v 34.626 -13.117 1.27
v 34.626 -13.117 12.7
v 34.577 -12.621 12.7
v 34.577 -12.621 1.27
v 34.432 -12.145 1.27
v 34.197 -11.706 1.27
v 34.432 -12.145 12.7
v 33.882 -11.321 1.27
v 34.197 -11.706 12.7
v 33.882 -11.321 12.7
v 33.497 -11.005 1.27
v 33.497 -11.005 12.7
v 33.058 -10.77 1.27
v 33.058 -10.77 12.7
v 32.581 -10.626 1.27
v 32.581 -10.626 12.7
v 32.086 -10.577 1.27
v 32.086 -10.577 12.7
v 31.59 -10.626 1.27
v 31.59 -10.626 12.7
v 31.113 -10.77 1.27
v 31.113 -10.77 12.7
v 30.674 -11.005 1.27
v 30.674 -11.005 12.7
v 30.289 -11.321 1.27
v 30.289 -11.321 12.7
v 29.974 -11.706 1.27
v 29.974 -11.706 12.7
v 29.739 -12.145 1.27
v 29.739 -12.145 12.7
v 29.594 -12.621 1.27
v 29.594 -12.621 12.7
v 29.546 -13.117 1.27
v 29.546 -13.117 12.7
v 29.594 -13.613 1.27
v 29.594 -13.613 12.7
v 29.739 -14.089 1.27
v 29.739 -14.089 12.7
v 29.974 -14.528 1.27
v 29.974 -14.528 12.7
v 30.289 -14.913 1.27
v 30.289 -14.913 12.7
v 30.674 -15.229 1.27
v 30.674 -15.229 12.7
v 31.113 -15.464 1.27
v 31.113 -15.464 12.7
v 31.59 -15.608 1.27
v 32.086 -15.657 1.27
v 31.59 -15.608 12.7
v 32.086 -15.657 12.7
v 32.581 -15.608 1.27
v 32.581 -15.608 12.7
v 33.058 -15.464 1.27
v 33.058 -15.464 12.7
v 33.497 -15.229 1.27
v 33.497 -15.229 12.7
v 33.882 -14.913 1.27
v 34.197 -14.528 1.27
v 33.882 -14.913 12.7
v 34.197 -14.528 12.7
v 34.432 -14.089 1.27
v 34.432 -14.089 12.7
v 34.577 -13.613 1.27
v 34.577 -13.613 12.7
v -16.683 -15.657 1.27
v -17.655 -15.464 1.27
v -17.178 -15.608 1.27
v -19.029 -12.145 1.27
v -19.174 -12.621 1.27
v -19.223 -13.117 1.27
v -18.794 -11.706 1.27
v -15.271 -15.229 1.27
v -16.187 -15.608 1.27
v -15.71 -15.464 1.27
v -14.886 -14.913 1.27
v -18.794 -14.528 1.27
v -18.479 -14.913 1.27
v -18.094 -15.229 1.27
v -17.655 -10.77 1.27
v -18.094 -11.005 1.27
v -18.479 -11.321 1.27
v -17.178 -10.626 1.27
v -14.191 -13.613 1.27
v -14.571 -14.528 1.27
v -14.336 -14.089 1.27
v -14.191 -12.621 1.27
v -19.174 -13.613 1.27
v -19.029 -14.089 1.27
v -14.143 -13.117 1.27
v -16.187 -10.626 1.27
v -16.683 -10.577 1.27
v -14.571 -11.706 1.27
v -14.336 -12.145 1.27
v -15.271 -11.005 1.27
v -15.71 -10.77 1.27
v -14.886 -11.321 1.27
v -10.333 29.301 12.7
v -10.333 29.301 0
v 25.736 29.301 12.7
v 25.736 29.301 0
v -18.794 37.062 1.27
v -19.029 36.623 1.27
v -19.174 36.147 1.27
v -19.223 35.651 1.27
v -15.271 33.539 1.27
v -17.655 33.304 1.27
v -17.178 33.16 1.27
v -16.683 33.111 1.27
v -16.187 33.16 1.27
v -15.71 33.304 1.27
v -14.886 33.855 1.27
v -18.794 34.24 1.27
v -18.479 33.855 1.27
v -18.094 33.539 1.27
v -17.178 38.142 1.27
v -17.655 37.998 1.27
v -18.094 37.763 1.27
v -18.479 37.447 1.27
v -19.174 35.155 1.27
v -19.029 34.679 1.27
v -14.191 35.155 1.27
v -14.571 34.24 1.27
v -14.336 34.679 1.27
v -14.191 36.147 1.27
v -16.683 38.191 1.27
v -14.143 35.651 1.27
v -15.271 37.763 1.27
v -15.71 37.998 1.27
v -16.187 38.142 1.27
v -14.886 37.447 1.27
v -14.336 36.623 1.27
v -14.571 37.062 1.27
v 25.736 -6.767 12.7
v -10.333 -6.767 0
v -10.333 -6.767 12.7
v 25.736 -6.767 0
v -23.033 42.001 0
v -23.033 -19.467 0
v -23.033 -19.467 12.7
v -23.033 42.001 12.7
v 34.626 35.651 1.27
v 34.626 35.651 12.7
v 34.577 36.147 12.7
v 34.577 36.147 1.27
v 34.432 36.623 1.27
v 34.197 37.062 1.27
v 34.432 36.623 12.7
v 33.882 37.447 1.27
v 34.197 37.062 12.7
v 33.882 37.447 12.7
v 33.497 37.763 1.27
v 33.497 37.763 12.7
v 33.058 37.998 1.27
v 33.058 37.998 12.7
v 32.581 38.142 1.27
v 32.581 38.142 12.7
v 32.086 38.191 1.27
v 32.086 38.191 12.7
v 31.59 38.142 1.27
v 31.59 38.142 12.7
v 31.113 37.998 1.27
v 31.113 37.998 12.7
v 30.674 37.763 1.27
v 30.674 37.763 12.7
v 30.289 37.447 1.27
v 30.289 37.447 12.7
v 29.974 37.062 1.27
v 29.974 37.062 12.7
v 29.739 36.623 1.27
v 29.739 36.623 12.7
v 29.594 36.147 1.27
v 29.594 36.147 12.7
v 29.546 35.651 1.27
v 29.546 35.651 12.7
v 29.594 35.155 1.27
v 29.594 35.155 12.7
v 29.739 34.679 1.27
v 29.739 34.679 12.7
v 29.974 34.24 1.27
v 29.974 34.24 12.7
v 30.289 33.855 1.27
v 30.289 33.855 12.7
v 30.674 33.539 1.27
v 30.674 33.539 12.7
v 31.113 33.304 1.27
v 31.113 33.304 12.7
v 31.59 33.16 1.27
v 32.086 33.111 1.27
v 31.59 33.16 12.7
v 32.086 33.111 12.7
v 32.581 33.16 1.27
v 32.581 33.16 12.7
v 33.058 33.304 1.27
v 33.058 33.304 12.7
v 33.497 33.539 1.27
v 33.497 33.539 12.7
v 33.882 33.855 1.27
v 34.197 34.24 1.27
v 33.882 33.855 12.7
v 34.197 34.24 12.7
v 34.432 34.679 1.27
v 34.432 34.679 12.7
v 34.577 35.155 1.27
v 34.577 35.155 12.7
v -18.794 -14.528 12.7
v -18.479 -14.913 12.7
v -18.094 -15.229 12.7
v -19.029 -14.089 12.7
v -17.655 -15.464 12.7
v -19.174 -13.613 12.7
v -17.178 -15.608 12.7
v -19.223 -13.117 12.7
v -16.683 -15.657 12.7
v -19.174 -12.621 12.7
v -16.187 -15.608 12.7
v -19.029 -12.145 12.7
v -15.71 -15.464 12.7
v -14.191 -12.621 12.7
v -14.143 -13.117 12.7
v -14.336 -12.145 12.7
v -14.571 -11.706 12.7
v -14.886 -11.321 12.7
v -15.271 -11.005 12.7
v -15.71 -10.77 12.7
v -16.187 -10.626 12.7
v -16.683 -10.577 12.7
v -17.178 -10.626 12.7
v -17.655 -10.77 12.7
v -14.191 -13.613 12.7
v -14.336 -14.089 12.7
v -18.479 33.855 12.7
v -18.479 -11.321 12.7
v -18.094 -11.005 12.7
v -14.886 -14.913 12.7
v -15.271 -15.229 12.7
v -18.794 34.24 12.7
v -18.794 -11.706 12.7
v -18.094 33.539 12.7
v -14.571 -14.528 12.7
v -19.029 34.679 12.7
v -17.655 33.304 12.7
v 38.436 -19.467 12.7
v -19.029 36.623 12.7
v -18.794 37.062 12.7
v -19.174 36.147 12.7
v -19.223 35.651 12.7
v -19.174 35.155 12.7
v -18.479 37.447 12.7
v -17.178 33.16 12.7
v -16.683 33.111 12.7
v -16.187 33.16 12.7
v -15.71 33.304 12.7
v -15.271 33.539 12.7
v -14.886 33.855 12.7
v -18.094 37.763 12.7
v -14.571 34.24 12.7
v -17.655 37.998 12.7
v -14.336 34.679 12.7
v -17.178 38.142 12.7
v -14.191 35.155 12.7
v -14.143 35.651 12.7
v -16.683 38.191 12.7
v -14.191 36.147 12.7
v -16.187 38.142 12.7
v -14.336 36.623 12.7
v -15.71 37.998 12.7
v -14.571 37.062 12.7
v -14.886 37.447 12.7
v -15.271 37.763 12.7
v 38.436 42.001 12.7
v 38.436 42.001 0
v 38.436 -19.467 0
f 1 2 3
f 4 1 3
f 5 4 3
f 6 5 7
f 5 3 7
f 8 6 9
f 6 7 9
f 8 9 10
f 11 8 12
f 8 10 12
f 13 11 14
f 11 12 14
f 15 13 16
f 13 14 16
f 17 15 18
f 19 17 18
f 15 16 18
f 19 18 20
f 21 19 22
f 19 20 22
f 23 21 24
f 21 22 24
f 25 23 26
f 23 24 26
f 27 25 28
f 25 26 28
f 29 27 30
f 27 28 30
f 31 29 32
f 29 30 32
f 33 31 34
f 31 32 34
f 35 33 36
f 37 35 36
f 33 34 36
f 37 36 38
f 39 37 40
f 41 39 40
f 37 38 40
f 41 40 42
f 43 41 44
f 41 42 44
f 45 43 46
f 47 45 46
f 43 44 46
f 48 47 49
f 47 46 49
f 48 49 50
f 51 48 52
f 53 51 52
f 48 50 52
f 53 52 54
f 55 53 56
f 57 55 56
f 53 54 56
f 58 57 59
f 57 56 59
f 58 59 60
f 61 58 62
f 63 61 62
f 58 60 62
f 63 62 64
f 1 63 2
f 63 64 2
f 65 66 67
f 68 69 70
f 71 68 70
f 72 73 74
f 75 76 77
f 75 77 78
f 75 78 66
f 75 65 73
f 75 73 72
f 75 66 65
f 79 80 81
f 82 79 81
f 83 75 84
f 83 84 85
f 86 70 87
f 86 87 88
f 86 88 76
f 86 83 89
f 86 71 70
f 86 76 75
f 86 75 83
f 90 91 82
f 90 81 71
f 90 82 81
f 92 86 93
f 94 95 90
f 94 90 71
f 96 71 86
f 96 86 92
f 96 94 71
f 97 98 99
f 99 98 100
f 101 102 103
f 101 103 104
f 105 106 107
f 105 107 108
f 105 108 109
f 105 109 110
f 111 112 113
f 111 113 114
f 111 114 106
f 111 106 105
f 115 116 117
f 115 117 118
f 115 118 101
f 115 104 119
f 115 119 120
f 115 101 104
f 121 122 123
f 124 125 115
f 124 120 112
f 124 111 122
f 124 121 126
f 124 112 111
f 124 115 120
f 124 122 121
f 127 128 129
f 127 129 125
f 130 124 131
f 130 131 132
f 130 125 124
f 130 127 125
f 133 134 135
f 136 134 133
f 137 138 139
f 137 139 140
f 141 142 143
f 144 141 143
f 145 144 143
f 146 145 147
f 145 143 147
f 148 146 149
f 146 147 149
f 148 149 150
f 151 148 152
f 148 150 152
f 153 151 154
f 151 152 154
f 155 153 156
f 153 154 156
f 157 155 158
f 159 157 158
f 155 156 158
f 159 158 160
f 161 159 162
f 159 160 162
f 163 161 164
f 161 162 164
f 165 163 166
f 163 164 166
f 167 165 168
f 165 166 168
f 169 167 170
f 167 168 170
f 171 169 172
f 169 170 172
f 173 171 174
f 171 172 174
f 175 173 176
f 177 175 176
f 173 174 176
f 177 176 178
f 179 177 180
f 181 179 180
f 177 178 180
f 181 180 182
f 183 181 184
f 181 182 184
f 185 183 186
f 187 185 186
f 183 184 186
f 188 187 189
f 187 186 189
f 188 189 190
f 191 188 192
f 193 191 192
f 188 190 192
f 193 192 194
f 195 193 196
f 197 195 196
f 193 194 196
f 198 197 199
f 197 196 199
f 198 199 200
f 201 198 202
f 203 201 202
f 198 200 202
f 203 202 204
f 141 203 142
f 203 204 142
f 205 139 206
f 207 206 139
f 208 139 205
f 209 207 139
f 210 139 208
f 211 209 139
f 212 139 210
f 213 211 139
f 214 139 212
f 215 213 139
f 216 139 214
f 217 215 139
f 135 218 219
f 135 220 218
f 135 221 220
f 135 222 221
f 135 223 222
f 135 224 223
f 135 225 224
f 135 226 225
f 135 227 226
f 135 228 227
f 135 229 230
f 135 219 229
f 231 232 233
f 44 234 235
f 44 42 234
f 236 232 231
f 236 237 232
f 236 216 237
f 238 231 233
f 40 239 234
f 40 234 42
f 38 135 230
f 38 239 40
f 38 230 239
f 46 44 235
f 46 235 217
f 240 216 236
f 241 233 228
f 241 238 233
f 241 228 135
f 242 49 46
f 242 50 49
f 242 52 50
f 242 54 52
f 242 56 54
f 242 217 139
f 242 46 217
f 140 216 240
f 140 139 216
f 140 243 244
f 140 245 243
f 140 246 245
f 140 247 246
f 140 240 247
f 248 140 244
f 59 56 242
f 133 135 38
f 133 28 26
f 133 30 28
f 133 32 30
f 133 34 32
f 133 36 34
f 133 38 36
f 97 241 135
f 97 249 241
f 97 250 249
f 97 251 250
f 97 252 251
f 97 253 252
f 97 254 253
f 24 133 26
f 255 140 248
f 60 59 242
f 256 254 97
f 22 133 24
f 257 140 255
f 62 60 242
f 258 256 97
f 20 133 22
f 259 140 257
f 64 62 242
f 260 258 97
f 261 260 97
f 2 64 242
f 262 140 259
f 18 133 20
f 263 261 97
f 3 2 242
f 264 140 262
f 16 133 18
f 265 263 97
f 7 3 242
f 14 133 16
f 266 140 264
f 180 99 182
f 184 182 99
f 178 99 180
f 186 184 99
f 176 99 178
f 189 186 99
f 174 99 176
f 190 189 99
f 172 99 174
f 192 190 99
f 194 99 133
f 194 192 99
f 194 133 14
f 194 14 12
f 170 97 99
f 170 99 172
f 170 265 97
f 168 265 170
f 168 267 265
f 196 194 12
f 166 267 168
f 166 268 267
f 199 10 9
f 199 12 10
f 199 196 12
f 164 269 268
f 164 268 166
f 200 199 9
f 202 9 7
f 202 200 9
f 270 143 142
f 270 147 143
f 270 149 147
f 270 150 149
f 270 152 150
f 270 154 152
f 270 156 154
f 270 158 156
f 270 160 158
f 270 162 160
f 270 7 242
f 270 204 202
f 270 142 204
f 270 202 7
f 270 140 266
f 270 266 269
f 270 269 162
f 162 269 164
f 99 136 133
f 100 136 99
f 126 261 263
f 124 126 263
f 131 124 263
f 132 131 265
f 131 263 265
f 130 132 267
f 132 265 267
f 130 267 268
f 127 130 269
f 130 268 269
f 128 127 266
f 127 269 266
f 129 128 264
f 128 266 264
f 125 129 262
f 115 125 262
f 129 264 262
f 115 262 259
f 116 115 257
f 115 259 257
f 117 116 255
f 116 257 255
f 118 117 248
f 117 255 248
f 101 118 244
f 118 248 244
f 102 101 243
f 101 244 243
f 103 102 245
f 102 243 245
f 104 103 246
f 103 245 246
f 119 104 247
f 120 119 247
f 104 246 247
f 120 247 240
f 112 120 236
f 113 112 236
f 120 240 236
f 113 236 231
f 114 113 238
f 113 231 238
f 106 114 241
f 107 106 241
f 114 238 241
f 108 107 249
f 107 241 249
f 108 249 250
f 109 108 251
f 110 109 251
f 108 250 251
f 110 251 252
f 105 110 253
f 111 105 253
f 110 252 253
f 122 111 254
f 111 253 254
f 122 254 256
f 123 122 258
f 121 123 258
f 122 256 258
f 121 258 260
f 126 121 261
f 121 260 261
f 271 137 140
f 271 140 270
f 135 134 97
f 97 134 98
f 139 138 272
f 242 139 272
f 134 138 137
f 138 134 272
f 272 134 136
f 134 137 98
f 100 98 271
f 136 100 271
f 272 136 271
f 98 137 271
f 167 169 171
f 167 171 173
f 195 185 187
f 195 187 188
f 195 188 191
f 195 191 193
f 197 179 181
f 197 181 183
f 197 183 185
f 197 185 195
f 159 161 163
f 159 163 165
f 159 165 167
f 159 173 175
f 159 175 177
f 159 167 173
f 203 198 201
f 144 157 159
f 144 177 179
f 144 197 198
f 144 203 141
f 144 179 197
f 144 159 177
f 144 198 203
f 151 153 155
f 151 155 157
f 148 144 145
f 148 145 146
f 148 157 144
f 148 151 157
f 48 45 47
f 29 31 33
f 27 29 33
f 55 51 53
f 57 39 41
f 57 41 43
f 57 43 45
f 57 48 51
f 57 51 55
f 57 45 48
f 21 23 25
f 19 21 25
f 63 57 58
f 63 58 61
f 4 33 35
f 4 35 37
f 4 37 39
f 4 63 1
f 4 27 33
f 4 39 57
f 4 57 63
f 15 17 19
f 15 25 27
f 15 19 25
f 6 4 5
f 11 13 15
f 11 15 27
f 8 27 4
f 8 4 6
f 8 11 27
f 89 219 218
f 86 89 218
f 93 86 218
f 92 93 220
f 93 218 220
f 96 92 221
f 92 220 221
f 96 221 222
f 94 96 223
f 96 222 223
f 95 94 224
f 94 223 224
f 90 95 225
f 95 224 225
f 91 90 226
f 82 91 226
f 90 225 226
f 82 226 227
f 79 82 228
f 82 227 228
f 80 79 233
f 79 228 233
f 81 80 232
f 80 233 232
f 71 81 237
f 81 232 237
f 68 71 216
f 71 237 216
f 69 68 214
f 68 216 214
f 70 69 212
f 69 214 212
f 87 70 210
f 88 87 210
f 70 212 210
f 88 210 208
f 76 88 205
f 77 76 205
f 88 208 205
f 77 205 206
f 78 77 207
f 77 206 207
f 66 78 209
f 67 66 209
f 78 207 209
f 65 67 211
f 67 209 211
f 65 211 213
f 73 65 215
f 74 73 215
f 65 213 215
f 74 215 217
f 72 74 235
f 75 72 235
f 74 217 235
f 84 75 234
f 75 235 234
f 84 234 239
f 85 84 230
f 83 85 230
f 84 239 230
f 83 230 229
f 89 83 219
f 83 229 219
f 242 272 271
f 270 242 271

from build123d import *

# Parameters (mm, degrees)
F0_W     = 61.468017
F0_H     = 61.468017
F0_W_2   = 36.068017
F0_H_2   = 36.068017
F1_DEPTH = 12.7
F2_R     = 2.54
F3_DEPTH = 11.43


with BuildPart() as f1:
    # F0 (on Top) → F1 (new body)
    with BuildSketch(Plane.XY):
        with Locations((7.701496, 11.267003)):
            Rectangle(F0_W, F0_H)
        with Locations((7.701497, 11.267004)):
            Rectangle(F0_W_2, F0_H_2, mode=Mode.SUBTRACT)
    extrude(amount=F1_DEPTH)

    # F2 (on face) → F3 (cut)
    with BuildSketch(Plane.XY.offset(12.7)):
        with Locations((-16.682512, 35.651012)):
            Circle(F2_R)
        with Locations((32.085505, 35.651012)):
            Circle(F2_R)
        with Locations((32.085505, -13.117005)):
            Circle(F2_R)
        with Locations((-16.682512, -13.117005)):
            Circle(F2_R)
    extrude(amount=-F3_DEPTH, mode=Mode.SUBTRACT)


solid = f1.part
